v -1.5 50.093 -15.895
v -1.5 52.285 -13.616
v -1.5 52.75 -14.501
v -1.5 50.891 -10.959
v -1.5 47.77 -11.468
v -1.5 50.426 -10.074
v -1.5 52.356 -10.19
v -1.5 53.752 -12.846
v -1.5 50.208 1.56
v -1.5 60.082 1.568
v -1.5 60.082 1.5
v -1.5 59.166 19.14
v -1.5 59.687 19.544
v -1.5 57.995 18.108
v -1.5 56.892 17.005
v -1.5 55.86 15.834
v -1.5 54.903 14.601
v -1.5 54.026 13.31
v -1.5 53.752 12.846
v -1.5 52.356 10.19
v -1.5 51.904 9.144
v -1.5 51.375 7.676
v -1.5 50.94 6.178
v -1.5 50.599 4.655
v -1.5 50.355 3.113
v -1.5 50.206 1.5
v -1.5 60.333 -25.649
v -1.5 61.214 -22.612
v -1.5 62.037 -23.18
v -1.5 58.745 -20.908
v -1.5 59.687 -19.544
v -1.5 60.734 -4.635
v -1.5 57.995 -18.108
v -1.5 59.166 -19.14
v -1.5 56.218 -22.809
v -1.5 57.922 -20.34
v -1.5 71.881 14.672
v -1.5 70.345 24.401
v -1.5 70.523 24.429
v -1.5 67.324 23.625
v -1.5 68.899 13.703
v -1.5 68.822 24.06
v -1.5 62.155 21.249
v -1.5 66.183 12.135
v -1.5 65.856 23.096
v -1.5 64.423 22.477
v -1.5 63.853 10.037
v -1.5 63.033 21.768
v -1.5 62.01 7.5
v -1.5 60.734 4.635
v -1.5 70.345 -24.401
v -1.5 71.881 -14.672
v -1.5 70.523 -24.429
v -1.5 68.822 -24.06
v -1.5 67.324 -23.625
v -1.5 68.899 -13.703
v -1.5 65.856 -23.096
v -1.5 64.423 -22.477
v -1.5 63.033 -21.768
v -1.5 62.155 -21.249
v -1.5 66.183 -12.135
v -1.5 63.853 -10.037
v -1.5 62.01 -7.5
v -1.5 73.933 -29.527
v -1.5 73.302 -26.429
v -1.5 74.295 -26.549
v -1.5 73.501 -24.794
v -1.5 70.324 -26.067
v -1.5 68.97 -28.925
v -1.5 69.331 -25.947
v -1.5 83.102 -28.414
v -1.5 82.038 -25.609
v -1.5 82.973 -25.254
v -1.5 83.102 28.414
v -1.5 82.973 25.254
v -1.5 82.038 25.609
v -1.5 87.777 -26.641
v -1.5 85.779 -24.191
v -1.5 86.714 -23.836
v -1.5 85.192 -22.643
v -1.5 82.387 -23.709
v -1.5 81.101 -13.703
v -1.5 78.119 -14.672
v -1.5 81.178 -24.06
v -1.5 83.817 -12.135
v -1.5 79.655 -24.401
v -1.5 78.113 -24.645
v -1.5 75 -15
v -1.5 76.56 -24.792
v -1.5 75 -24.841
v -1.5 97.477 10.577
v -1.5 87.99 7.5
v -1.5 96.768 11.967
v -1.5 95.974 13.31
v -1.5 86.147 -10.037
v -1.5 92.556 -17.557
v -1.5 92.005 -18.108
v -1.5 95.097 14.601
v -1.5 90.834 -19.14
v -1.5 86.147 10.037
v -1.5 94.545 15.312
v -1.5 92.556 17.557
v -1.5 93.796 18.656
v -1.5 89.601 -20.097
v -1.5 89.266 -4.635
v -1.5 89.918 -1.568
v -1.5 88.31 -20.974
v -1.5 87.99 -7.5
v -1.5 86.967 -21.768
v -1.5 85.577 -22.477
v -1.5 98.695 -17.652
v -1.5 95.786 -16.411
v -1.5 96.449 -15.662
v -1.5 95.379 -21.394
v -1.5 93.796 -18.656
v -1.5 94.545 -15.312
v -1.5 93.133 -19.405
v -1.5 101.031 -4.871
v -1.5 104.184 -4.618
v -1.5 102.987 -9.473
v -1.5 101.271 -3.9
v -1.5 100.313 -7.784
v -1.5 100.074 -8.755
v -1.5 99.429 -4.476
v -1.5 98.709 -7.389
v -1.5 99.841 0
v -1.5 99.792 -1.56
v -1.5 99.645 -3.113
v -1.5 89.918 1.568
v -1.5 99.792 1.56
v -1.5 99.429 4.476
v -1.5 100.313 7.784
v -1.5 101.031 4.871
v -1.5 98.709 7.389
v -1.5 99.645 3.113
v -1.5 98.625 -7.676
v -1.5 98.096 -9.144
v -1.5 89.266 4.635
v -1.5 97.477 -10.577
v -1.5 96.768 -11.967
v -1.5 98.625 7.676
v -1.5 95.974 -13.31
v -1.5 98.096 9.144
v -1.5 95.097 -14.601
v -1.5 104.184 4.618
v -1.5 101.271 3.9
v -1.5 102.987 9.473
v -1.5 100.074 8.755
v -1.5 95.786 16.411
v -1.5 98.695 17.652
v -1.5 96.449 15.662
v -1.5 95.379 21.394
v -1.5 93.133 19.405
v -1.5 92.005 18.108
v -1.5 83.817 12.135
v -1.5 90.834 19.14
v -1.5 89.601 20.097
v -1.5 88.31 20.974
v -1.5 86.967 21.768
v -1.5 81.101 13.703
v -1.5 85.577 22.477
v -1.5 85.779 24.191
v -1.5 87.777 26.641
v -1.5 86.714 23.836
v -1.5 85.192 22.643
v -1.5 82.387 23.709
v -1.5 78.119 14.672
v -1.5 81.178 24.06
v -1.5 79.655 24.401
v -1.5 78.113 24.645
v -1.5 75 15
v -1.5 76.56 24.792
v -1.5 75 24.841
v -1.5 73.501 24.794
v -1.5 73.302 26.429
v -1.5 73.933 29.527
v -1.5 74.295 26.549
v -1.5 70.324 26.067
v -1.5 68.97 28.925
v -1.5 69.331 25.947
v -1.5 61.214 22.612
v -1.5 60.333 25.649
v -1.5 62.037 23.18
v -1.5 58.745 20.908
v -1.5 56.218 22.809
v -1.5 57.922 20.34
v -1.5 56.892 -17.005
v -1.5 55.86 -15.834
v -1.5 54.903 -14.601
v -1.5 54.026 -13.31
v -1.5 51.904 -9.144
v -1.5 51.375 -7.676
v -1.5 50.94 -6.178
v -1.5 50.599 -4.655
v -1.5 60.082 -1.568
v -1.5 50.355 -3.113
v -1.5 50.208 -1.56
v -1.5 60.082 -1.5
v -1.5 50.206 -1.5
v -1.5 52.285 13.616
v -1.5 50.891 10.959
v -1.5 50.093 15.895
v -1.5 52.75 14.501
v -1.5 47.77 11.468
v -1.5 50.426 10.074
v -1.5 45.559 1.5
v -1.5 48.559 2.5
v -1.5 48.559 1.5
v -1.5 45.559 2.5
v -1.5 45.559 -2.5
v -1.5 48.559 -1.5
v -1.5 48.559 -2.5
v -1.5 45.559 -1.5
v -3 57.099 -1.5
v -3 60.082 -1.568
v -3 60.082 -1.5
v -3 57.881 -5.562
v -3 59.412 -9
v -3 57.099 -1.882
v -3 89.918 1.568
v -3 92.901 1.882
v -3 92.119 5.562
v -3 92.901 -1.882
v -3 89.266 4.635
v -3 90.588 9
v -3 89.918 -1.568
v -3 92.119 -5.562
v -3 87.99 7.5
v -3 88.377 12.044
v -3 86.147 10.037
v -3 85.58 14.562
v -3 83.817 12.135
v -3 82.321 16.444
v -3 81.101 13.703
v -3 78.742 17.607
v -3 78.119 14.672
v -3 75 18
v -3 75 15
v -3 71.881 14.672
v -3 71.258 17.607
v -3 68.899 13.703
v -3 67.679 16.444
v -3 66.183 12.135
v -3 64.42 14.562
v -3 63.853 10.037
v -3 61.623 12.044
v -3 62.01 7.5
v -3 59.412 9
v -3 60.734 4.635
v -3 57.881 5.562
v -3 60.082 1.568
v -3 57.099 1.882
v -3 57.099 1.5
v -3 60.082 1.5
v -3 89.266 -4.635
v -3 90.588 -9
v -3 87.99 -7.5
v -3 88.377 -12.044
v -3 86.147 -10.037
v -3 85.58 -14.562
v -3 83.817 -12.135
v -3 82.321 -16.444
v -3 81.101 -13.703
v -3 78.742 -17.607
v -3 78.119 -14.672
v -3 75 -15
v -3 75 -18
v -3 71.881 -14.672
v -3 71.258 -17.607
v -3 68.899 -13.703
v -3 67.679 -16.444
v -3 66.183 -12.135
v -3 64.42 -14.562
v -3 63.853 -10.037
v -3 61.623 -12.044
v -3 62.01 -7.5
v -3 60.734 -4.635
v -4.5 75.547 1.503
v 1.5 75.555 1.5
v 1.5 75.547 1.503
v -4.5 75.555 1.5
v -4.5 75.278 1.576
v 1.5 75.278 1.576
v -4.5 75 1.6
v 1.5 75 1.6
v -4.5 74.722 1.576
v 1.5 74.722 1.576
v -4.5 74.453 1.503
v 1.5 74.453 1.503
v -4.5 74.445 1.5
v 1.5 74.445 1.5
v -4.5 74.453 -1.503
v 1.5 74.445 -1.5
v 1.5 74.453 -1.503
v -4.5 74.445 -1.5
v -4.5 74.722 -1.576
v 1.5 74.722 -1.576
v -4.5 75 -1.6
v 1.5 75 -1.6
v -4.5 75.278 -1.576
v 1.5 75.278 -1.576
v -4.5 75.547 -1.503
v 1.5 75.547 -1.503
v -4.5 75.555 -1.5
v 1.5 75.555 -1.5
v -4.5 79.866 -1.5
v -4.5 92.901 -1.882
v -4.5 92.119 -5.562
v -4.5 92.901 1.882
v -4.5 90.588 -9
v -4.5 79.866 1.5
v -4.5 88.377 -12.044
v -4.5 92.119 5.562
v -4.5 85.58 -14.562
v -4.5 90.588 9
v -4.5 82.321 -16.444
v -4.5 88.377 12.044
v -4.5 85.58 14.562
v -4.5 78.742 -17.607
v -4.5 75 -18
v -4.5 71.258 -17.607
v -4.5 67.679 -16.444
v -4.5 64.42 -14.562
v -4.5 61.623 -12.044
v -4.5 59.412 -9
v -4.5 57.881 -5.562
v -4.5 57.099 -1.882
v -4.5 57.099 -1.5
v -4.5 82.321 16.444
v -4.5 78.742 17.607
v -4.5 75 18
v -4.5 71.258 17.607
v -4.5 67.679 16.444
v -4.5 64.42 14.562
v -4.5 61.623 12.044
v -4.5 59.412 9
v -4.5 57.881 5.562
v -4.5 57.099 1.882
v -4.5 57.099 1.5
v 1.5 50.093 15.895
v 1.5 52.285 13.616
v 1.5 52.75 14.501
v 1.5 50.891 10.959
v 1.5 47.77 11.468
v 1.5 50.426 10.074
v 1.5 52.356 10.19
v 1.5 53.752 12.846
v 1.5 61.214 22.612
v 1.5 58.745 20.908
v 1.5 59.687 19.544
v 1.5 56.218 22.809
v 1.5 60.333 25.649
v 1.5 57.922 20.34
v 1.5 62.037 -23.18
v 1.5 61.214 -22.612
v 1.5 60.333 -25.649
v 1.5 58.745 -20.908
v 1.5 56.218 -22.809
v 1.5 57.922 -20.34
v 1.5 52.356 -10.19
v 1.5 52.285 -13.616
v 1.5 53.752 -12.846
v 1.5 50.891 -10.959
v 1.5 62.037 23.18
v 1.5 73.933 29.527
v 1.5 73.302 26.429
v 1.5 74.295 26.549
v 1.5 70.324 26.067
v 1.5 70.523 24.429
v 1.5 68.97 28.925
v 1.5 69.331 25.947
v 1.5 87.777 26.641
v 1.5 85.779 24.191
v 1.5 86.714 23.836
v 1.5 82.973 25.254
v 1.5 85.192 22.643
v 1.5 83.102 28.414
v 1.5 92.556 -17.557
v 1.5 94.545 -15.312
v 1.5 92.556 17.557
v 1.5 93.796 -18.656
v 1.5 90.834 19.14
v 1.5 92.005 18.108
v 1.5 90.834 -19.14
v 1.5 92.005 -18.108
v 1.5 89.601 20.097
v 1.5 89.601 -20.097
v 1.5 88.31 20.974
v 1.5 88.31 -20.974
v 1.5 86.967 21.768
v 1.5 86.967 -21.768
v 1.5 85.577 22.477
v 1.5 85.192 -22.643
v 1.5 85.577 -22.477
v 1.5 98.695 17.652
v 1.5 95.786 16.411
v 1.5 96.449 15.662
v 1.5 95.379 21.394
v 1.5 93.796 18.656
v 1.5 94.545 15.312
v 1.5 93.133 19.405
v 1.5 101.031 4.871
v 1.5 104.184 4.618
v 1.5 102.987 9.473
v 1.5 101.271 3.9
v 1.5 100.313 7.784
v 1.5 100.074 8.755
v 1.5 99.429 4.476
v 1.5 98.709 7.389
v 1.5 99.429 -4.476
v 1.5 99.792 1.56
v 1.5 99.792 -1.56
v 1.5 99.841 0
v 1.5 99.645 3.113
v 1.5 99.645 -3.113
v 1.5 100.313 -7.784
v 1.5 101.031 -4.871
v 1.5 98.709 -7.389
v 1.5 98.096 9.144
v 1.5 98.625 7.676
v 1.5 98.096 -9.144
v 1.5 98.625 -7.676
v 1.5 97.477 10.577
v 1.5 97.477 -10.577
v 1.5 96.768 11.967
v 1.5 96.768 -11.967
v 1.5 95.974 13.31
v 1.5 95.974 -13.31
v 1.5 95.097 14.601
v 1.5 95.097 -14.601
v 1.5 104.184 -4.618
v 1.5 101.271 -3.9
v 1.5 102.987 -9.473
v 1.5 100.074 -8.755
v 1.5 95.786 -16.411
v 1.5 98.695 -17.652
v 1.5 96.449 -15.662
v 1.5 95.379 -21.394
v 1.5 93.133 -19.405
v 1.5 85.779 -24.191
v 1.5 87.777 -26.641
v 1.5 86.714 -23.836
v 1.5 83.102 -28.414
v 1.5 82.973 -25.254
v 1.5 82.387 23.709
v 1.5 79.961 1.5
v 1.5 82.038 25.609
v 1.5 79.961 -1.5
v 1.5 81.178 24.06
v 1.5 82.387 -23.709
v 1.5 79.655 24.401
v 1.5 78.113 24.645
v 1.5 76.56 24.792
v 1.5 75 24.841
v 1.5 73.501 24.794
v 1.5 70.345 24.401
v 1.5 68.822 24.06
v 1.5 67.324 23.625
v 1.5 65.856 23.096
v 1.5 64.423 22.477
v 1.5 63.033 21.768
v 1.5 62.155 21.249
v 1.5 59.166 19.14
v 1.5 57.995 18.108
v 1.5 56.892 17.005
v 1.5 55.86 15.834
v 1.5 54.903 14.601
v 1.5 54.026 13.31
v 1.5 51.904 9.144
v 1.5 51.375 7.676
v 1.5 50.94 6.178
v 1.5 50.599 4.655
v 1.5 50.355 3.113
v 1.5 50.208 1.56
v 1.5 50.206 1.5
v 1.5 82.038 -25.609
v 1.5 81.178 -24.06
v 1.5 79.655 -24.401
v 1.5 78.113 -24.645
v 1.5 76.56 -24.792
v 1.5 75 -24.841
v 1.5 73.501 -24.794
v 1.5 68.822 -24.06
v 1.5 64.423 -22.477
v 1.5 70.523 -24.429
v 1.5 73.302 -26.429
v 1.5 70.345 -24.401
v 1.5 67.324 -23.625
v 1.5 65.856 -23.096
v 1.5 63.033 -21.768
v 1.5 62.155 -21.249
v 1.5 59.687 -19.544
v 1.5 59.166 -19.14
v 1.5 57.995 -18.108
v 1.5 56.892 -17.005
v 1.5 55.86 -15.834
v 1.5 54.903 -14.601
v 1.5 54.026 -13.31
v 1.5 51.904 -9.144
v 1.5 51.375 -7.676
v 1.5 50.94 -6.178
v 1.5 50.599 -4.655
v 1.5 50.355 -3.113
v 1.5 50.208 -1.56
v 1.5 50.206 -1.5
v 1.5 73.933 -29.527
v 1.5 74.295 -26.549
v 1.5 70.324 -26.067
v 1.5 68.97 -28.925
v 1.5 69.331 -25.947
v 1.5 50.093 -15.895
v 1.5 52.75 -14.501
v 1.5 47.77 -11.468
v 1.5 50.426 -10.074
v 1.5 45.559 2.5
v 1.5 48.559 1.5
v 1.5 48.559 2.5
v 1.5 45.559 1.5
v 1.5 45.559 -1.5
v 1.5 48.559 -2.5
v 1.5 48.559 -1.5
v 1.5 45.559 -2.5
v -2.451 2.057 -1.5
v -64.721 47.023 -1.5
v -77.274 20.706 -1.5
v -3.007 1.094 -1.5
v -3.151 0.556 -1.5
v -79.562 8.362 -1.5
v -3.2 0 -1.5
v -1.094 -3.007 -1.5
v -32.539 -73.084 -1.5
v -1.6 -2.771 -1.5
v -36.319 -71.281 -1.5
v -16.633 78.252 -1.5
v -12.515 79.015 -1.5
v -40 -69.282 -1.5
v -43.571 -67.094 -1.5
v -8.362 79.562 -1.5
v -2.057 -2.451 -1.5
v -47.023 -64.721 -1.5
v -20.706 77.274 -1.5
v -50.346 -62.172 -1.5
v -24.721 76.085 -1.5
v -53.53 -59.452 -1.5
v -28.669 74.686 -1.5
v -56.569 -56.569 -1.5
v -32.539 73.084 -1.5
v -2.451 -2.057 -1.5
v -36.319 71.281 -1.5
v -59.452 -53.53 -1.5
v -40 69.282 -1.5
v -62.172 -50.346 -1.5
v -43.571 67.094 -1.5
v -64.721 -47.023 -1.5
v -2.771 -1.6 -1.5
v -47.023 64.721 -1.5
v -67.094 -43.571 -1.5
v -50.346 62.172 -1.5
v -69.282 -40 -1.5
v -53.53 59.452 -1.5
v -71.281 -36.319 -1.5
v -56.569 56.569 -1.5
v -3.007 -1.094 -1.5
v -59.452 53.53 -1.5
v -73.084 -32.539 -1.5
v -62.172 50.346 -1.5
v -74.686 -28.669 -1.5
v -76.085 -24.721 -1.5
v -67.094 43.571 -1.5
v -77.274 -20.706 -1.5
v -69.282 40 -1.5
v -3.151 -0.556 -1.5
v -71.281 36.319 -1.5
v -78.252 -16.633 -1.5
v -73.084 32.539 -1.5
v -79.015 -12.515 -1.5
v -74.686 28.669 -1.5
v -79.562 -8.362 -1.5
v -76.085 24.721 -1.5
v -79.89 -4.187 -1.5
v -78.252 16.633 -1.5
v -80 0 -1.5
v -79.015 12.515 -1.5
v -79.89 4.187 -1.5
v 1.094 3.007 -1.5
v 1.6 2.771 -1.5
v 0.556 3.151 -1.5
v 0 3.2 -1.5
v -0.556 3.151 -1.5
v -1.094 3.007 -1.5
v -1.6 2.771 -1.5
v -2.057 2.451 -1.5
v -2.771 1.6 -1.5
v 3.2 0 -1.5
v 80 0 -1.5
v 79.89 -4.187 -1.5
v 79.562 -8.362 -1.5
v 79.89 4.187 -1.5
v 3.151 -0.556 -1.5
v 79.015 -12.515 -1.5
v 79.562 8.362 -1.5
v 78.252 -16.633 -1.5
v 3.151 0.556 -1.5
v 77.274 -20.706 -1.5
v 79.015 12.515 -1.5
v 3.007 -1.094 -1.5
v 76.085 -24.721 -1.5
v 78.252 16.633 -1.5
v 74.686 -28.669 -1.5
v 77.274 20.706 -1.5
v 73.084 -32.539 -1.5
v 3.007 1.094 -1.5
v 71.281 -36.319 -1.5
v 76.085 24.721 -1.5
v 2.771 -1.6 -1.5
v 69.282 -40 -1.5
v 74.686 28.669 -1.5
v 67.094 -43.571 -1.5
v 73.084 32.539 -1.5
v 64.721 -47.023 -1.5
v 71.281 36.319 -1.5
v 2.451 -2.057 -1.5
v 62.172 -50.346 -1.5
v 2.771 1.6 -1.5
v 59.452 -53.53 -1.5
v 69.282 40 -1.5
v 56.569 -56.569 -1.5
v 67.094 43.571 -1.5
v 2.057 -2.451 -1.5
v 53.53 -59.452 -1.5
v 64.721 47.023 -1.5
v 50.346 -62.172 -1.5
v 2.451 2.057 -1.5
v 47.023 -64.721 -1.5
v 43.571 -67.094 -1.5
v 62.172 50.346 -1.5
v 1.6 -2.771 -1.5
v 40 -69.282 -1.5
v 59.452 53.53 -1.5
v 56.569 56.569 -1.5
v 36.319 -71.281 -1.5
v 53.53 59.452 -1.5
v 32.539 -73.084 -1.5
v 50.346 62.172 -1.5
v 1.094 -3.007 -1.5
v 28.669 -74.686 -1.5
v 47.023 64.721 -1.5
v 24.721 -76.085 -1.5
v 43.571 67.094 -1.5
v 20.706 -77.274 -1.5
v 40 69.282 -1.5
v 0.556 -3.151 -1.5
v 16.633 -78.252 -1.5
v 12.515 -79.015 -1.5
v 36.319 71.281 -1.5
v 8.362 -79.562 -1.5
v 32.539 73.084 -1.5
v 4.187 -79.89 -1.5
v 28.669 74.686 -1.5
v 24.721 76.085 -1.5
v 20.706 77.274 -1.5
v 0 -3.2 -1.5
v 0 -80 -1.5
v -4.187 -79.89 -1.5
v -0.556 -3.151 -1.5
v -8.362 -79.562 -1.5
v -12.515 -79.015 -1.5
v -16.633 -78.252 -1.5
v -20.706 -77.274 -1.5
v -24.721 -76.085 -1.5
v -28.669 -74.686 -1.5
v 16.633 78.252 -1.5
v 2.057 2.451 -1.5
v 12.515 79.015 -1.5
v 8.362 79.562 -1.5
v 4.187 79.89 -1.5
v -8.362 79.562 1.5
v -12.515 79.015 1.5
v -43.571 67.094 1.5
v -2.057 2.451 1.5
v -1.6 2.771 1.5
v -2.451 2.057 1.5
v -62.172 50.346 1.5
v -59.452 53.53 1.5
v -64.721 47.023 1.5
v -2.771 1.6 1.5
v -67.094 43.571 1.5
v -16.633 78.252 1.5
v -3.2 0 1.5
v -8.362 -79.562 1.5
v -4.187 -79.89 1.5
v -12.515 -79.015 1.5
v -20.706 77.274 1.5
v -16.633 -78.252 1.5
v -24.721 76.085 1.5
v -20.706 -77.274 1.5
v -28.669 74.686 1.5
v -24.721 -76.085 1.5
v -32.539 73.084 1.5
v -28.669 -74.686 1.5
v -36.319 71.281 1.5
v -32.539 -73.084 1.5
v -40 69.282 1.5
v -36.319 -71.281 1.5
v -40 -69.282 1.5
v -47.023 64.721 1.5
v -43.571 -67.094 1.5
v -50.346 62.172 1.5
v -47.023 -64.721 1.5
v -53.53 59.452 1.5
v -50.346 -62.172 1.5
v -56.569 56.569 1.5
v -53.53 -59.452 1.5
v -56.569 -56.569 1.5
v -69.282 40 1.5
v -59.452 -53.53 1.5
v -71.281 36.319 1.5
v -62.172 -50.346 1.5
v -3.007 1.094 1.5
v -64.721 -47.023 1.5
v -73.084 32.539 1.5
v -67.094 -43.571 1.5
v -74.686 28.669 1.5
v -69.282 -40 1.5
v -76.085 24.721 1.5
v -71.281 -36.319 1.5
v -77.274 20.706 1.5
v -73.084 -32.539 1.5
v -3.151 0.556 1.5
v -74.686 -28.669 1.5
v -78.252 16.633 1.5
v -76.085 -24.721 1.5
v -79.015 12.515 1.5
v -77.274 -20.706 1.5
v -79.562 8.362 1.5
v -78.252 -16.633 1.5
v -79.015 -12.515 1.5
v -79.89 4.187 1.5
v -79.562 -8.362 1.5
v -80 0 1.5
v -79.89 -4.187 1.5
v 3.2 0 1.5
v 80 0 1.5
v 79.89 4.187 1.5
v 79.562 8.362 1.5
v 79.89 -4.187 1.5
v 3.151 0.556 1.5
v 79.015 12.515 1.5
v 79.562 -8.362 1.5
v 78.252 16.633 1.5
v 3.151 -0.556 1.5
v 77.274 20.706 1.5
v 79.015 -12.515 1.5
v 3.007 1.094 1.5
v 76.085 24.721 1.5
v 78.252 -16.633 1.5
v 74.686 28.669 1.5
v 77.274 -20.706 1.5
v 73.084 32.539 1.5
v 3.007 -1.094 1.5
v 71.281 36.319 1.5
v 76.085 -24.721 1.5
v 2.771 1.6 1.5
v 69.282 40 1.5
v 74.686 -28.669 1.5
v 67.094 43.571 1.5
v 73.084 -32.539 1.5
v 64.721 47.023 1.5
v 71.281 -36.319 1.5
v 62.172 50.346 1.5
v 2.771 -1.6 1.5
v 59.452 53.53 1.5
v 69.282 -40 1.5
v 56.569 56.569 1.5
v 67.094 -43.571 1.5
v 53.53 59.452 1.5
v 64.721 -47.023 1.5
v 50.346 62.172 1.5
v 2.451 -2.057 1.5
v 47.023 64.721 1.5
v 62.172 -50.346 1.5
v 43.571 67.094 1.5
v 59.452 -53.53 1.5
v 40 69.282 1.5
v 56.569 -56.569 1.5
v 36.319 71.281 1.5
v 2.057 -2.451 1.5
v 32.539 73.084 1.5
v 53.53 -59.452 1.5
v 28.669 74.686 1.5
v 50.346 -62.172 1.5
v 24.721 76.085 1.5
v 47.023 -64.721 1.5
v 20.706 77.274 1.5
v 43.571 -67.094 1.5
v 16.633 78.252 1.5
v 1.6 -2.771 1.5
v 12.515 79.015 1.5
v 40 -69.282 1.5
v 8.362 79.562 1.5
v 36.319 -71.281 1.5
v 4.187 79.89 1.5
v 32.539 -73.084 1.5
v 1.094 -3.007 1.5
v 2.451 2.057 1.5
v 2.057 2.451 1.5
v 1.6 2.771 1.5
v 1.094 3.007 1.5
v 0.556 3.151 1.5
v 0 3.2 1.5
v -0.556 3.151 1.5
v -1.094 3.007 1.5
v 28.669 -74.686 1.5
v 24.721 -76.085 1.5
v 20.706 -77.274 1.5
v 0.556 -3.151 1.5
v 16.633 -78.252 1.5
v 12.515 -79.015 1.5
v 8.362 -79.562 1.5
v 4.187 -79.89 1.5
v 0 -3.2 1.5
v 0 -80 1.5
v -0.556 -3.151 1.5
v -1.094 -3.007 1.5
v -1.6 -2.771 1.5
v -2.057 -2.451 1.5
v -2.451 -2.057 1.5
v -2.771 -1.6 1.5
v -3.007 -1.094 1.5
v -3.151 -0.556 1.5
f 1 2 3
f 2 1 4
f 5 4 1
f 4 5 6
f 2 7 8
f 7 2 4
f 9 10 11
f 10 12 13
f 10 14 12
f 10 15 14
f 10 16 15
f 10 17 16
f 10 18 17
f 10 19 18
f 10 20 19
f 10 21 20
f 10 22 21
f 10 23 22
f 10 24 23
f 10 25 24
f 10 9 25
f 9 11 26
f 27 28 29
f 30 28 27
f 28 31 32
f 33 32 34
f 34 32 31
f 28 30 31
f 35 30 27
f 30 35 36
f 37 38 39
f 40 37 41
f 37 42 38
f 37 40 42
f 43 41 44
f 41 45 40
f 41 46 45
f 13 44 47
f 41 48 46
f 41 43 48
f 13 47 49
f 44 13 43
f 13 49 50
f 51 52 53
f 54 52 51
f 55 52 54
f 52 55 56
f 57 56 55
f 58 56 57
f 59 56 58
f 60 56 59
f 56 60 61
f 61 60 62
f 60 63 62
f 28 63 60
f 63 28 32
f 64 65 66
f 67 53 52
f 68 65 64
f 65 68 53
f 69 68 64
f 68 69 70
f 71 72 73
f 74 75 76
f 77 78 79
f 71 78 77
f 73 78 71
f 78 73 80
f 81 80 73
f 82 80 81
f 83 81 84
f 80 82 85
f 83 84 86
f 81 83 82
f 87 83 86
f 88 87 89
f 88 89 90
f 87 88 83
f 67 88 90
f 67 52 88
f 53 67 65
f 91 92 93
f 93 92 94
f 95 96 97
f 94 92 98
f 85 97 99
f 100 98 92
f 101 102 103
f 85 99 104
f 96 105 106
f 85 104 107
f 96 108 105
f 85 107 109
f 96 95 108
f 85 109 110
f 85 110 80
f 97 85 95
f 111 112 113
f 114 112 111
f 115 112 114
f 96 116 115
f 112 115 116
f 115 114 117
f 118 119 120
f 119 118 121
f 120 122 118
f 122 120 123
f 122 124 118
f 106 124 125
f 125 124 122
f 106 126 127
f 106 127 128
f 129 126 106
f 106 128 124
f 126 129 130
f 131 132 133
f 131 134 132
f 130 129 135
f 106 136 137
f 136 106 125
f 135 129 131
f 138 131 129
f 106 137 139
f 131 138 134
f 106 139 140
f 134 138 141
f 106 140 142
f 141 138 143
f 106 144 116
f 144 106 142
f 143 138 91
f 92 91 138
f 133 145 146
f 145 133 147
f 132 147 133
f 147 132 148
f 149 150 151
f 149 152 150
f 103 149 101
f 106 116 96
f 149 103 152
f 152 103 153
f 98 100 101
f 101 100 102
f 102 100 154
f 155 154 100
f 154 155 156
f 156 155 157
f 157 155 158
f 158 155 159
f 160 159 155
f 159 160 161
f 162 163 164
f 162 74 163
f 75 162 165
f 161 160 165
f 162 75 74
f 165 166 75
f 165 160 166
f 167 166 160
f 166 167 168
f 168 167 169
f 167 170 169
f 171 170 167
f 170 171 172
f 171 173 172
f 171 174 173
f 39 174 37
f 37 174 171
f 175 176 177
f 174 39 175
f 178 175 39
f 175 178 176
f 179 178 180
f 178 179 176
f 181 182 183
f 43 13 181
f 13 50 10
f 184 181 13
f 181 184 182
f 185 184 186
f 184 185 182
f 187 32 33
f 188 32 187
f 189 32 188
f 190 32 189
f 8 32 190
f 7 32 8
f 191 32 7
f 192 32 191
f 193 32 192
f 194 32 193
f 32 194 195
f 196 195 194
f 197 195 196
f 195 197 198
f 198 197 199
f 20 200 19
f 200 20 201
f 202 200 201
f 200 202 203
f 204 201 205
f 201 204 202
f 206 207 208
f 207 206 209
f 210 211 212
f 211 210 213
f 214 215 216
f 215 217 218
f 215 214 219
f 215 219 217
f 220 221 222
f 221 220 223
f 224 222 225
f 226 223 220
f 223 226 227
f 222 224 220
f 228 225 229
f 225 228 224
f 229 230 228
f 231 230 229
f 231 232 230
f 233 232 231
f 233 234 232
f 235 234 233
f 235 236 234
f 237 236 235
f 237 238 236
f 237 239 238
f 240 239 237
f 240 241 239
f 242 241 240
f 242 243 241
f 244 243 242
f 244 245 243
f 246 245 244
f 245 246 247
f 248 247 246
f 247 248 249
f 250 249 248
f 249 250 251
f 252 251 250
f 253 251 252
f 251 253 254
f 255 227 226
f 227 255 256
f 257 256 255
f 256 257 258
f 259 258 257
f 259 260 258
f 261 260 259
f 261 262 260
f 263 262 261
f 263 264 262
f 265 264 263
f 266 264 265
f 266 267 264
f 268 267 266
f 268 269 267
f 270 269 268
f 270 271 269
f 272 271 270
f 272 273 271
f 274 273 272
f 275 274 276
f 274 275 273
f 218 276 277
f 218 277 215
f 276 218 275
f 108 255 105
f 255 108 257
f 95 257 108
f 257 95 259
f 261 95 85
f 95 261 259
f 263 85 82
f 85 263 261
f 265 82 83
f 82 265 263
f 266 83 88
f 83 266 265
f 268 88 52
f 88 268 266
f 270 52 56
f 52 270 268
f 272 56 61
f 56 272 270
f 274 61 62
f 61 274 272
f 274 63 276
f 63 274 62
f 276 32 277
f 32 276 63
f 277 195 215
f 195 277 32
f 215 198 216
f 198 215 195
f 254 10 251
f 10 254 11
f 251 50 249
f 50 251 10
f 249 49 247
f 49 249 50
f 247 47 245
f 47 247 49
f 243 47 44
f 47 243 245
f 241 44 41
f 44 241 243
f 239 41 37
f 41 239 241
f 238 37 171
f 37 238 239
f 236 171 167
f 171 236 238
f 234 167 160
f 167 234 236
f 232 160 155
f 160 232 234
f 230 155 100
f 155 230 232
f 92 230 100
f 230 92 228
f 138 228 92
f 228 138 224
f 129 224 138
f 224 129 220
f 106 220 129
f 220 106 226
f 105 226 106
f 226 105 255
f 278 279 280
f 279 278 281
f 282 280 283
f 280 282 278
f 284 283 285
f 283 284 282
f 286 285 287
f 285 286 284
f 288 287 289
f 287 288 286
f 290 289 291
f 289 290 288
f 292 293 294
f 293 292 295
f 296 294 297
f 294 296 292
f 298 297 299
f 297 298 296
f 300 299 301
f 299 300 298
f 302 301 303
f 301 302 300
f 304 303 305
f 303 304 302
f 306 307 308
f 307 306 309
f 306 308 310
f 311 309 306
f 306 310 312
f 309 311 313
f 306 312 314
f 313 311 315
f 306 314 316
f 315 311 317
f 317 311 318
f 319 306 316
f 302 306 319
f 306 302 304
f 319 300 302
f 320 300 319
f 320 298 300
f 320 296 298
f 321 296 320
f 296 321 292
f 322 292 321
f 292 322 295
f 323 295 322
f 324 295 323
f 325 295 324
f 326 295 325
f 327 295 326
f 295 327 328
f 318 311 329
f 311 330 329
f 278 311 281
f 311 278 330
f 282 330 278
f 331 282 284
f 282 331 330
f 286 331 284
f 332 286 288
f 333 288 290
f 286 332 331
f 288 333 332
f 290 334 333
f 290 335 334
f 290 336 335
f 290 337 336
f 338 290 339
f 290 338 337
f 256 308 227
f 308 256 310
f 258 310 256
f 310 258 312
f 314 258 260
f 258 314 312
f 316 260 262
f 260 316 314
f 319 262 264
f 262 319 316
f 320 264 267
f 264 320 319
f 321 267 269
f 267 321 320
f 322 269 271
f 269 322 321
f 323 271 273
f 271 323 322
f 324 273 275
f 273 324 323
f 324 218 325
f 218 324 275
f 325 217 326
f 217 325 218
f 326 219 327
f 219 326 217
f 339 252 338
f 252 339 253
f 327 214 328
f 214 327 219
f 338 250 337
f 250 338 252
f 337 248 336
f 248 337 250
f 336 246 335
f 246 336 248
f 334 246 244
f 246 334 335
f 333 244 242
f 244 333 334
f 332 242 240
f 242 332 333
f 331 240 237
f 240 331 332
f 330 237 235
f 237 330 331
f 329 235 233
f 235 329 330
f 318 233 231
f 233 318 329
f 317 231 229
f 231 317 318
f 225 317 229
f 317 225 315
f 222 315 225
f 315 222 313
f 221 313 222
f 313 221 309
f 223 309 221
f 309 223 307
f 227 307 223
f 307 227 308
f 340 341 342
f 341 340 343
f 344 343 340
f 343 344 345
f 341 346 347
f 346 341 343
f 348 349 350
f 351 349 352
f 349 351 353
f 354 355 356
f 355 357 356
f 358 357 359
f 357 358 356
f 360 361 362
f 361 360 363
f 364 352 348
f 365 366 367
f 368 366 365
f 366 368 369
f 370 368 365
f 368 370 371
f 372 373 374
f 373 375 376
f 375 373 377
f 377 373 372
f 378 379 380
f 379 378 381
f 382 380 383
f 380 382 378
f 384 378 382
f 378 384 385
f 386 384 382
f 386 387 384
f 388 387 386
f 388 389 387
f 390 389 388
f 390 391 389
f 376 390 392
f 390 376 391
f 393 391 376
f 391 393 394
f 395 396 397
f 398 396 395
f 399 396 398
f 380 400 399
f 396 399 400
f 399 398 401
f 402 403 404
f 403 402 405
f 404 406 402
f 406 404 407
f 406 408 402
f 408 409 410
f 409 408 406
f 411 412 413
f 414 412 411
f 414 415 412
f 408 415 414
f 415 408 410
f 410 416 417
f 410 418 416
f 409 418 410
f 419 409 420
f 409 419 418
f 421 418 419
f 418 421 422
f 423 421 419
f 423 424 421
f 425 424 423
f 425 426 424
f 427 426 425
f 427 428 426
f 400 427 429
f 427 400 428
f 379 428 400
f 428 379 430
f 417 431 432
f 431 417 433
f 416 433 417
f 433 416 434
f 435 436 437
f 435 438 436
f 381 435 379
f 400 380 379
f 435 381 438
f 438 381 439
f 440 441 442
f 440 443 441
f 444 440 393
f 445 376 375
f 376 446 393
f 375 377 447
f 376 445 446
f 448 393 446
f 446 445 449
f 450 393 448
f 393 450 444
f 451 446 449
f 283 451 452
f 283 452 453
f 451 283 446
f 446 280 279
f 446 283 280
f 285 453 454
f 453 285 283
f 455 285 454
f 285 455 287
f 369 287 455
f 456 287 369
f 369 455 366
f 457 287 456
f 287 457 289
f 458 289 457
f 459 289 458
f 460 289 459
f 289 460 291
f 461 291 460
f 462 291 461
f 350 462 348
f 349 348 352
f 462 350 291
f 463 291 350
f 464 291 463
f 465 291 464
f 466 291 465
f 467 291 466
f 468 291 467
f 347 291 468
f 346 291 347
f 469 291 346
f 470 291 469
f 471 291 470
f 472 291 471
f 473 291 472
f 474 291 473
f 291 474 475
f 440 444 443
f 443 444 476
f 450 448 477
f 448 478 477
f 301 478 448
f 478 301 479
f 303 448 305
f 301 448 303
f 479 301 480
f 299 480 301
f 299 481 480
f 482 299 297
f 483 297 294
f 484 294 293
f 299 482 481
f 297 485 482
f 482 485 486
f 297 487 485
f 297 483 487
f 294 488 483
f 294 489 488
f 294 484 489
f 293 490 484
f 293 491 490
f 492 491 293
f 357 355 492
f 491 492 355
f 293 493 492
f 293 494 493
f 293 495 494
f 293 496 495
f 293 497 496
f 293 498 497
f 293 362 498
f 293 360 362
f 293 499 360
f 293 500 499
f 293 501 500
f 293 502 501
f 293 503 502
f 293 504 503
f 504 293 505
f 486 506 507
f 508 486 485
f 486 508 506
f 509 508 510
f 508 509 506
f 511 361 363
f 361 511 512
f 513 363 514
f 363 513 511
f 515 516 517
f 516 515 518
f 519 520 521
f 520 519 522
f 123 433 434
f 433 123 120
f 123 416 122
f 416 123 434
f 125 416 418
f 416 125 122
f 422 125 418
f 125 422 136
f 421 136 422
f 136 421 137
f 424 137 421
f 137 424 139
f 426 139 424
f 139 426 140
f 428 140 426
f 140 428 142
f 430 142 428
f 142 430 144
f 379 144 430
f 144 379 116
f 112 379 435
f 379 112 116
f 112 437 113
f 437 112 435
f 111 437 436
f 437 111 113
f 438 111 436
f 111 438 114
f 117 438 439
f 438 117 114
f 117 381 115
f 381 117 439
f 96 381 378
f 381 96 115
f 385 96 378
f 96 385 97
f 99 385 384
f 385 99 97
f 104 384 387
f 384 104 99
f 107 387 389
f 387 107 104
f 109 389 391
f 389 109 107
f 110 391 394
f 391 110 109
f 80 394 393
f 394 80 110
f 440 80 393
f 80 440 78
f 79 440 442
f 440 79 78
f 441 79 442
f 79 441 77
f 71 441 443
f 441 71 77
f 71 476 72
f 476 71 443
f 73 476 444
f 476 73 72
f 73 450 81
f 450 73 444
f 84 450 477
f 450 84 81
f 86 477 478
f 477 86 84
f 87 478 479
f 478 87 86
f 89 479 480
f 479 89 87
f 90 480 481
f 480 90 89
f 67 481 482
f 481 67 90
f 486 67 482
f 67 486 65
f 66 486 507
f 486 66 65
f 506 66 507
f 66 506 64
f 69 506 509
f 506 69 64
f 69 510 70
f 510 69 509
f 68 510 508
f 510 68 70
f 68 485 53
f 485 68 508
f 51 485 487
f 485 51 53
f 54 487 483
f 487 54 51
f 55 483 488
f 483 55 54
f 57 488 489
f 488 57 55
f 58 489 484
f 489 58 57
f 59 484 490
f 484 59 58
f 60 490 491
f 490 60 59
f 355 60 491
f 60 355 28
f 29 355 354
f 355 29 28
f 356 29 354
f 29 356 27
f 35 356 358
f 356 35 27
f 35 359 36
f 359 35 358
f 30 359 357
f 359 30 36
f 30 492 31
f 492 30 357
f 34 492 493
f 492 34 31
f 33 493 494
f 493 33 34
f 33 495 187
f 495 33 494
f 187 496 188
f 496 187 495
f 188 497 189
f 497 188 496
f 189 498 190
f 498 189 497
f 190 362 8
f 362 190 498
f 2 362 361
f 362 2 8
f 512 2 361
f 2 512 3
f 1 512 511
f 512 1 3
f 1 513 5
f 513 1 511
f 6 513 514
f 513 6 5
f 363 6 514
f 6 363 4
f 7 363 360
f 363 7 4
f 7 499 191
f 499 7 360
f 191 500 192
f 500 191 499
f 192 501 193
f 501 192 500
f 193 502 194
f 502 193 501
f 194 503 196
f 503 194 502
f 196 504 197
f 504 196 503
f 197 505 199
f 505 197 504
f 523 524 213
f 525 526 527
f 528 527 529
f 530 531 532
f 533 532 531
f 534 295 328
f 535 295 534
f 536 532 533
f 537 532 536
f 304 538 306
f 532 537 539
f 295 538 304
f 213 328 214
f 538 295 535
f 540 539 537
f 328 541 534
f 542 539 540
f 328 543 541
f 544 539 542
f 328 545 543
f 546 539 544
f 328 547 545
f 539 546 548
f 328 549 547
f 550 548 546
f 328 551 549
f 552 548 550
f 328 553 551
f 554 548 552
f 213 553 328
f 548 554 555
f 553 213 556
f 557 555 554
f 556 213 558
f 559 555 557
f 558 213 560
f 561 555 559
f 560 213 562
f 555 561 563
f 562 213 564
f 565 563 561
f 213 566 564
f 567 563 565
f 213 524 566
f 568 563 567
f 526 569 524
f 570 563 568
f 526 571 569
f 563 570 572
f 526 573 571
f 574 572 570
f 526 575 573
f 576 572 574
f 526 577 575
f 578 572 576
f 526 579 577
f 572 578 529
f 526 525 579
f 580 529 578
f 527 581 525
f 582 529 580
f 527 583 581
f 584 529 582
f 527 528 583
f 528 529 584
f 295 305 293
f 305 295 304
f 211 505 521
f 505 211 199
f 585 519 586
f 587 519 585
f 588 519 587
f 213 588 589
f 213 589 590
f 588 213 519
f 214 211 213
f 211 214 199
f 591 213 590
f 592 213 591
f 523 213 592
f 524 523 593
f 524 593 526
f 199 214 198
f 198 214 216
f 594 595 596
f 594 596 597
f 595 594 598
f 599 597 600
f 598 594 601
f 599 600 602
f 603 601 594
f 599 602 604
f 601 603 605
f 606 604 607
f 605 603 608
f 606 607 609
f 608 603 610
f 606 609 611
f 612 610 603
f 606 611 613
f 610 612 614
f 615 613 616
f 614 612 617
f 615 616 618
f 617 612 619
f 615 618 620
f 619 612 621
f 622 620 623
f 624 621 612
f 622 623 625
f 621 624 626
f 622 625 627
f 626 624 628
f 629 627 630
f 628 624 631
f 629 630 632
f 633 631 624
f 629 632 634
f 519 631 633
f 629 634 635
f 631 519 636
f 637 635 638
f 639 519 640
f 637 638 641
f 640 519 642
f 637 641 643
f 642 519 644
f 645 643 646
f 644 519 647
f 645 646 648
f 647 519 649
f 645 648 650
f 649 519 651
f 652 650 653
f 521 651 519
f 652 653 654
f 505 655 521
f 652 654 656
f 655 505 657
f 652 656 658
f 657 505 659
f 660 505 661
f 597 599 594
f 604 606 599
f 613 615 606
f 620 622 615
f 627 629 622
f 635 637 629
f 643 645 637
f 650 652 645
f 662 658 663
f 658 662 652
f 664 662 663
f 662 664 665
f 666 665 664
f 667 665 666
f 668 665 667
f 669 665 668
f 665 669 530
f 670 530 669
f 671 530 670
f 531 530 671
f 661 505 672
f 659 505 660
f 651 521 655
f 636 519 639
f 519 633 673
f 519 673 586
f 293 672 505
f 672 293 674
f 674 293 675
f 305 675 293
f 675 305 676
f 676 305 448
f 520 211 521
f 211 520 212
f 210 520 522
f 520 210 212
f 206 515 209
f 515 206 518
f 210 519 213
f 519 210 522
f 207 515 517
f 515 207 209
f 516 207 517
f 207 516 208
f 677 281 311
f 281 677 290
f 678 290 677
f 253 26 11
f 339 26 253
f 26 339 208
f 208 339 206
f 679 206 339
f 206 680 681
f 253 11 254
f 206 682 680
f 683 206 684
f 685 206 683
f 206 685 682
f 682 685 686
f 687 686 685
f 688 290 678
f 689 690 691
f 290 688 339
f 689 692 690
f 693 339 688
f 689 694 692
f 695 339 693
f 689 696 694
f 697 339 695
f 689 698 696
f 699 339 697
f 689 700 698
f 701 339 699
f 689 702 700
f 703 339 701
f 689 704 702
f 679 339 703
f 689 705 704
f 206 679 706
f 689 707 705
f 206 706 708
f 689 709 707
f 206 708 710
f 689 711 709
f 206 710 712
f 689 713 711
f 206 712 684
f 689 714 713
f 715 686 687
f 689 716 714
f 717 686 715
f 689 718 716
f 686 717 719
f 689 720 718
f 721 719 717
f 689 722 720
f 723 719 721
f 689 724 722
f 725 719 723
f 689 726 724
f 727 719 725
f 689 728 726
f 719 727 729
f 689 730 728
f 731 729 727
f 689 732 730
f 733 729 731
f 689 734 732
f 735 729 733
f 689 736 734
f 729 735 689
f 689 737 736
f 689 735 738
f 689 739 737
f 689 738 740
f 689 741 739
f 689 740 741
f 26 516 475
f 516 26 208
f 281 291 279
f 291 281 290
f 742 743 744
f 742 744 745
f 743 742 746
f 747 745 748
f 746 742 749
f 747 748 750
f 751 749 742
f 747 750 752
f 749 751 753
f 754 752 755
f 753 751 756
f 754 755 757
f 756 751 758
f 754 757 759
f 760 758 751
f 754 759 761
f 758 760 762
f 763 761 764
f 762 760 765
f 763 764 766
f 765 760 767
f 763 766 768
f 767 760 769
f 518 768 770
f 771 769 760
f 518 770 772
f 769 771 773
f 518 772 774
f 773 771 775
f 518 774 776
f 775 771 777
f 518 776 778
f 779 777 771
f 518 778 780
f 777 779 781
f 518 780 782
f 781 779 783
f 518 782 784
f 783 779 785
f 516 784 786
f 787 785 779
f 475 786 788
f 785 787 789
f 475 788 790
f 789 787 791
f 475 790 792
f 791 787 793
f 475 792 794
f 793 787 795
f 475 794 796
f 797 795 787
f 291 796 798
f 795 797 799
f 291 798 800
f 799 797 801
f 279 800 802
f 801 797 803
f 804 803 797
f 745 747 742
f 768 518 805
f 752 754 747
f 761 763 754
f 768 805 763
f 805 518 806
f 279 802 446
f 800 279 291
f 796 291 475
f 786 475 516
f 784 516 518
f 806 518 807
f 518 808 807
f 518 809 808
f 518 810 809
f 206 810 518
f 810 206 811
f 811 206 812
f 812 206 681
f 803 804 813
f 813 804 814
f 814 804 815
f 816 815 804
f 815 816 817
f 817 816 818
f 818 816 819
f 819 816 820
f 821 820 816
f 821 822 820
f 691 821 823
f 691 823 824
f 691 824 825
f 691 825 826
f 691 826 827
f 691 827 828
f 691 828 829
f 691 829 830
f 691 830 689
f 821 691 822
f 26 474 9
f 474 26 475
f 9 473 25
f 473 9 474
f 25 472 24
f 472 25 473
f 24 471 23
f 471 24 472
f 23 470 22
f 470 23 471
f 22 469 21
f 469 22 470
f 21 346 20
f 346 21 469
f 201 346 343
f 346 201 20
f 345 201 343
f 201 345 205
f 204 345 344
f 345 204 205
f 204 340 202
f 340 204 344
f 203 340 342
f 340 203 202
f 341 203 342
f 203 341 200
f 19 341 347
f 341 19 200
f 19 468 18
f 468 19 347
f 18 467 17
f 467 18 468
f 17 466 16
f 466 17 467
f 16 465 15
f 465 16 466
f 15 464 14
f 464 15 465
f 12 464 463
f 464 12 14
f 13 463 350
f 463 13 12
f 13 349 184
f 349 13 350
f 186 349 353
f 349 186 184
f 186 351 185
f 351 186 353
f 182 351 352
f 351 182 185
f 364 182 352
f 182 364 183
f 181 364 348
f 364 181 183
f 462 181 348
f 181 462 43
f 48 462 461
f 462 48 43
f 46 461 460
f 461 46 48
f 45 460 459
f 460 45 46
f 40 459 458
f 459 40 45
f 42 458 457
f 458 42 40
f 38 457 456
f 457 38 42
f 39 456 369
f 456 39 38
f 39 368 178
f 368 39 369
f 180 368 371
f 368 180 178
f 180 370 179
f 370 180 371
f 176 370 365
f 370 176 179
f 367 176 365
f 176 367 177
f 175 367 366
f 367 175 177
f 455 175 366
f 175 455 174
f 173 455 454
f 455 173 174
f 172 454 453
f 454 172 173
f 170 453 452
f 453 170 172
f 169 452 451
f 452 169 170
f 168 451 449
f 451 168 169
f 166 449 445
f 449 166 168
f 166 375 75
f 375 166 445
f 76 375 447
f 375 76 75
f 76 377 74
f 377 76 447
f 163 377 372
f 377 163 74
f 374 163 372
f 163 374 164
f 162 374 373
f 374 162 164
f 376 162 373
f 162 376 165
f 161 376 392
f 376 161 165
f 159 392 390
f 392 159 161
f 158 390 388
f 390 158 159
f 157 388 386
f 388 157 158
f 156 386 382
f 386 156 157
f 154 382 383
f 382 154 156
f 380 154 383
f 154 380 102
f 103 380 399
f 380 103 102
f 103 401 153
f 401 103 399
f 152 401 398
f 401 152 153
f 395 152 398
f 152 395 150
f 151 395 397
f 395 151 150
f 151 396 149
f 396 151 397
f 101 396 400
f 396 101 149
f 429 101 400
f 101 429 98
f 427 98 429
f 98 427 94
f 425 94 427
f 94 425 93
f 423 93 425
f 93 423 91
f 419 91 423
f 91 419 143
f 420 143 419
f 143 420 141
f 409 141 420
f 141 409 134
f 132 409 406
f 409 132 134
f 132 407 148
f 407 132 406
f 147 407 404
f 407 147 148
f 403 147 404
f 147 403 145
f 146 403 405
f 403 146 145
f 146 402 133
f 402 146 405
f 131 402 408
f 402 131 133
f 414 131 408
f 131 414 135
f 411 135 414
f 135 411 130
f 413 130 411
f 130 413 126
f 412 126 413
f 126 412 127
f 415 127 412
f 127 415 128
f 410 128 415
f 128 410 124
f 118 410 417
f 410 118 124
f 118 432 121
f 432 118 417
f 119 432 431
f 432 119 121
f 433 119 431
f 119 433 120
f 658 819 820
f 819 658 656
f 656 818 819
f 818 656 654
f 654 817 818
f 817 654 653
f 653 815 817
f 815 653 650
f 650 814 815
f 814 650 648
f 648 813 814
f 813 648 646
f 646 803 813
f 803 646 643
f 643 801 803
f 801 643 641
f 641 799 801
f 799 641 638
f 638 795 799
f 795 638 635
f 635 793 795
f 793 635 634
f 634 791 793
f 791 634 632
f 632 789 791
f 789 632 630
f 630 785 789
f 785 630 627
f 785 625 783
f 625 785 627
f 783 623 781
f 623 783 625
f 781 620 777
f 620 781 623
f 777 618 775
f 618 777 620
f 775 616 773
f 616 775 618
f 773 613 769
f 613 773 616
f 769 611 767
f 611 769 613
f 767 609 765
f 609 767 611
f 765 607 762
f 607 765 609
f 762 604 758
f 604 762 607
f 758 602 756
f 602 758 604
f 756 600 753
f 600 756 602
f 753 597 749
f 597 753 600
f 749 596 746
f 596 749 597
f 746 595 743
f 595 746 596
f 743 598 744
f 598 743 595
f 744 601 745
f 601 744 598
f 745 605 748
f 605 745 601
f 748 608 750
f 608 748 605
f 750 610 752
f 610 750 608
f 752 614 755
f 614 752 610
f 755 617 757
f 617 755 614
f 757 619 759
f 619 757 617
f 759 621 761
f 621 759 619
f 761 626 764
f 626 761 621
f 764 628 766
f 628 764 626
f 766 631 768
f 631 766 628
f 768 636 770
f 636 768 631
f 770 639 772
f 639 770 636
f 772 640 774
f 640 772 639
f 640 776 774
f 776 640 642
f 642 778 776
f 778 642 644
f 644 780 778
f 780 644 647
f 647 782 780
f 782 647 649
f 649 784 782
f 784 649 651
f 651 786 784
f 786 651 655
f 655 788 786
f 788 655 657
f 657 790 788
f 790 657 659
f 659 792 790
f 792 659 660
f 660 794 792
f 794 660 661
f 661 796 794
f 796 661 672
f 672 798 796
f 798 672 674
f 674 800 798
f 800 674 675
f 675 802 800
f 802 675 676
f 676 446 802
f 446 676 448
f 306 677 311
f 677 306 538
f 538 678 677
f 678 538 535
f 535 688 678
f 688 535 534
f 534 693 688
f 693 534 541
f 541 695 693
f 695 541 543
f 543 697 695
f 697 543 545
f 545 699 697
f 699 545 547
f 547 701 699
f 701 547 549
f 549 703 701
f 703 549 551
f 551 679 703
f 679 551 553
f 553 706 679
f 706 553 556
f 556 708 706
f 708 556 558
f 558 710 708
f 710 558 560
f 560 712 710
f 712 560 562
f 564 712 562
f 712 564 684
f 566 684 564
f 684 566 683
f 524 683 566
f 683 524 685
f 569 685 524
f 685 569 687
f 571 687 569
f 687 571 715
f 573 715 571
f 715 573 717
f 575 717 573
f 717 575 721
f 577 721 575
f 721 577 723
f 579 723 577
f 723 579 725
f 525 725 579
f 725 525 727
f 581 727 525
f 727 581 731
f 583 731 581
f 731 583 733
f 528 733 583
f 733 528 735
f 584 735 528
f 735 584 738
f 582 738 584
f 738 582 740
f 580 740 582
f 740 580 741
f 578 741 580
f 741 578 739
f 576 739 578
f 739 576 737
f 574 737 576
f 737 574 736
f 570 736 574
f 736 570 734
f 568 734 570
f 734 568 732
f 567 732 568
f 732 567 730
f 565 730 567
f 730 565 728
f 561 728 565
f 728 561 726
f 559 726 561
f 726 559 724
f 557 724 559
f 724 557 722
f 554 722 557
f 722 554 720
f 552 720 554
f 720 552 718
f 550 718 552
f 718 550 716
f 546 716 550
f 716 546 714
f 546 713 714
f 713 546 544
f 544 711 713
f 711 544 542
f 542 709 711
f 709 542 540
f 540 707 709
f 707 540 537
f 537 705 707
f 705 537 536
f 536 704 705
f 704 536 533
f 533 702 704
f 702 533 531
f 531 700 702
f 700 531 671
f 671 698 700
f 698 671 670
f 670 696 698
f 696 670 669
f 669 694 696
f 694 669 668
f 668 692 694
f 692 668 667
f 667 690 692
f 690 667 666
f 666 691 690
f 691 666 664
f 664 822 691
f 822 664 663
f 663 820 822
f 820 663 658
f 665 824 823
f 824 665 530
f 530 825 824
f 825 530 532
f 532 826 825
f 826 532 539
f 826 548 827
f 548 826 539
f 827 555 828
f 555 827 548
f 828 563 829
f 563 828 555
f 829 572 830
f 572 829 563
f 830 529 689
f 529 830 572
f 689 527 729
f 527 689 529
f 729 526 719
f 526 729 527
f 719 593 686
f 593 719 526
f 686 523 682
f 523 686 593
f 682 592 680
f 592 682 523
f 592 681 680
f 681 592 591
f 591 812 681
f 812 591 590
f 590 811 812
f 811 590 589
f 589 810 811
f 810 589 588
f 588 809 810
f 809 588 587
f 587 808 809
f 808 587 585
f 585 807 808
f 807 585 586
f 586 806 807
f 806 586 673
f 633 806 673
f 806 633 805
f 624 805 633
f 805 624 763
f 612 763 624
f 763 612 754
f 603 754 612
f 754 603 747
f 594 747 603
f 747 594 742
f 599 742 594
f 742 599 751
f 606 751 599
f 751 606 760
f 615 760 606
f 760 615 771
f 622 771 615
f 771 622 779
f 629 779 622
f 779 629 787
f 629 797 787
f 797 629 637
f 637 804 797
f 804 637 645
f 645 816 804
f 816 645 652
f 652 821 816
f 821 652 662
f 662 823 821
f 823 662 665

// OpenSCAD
piece_spacing = 12;
piece_size = 10;
material_thickness = 3;
piece_material_thickness = 1.6;

disc_r = piece_spacing * 13 / 3.14 / 2;
echo("disc radius: ", disc_r);


torus_r = 75;

support_h = 50;

module ext(h=3) {
  linear_extrude(height=h) child(0);
}

module tab() {
  square(size=[material_thickness, piece_material_thickness*2], center=true);
  translate([0, piece_material_thickness + 1.5, 0]) square(size=[material_thickness+2, 3], center=true);
}

module main_disc(num_positions) {
  difference() {
    union() {
      circle(r=disc_r, $fn=100);
      for (i=[1:num_positions]) {
        rotate([0, 0, i*360/num_positions]) {
          translate([0, disc_r, 0]) tab();
        }
      }
    }
    circle(r=1.6, $fn=36);
  }

}

module disc_pulley_inside() {
  difference() {
    circle(r=15);
    circle(r=1.6, $fn=36);
  }
}

module disc_pulley_outside() {
  difference() {
    circle(r=18);
    circle(r=1.6, $fn=36);
    translate([0, 16.5, 0]) {
      for (i=[-1,1]) {
        translate([i, 0, 0]) circle(r=0.5, $fn=36);
      }
    }
  }
}

module disc_pulley_assembly() {
  ext(1.5) disc_pulley_inside();
  translate([0, 0, 1.5]) ext(1.5) disc_pulley_outside();
}

module disc_assembly(num_positions) {
  translate([0, 0, -1.5]) ext() {
    main_disc(num_positions);
  }
  translate([0, 0, 1.5]) disc_pulley_assembly();
}

module support_strut() {
  difference() {
    union() {
      circle(r=5, $fn=36);
      translate([0, (support_h - 5)/-2, 0]) square(size=[10, support_h-5], center=true);
    }

    circle(r=1.6, $fn=36);
  }
}

module bottom_support_disc() {
  difference() {
    circle(r=torus_r+5, $fn=120);
    circle(r=3.2, $fn=36);
    // for (i=[0:12]) {
    //   rotate([0, 0, i*360/13]) translate([0, torus_r, 0]) {
    //     square(size=[10, disc_r *2 + 10], center=true);
    //   }
    // }
  }
}

for (i=[0:0]) {
  rotate([0, 0, i*360/13]) translate([0, torus_r, 0]) {
    rotate([0, 90, 180]) {
      disc_assembly(13);
    }
    // translate([1.5, 0, 0]) rotate([90, 00, 90]) linear_extrude(height=3) {support_strut();}
    
  }
  
}

translate([0, 0, -material_thickness/2]) ext() bottom_support_disc();
